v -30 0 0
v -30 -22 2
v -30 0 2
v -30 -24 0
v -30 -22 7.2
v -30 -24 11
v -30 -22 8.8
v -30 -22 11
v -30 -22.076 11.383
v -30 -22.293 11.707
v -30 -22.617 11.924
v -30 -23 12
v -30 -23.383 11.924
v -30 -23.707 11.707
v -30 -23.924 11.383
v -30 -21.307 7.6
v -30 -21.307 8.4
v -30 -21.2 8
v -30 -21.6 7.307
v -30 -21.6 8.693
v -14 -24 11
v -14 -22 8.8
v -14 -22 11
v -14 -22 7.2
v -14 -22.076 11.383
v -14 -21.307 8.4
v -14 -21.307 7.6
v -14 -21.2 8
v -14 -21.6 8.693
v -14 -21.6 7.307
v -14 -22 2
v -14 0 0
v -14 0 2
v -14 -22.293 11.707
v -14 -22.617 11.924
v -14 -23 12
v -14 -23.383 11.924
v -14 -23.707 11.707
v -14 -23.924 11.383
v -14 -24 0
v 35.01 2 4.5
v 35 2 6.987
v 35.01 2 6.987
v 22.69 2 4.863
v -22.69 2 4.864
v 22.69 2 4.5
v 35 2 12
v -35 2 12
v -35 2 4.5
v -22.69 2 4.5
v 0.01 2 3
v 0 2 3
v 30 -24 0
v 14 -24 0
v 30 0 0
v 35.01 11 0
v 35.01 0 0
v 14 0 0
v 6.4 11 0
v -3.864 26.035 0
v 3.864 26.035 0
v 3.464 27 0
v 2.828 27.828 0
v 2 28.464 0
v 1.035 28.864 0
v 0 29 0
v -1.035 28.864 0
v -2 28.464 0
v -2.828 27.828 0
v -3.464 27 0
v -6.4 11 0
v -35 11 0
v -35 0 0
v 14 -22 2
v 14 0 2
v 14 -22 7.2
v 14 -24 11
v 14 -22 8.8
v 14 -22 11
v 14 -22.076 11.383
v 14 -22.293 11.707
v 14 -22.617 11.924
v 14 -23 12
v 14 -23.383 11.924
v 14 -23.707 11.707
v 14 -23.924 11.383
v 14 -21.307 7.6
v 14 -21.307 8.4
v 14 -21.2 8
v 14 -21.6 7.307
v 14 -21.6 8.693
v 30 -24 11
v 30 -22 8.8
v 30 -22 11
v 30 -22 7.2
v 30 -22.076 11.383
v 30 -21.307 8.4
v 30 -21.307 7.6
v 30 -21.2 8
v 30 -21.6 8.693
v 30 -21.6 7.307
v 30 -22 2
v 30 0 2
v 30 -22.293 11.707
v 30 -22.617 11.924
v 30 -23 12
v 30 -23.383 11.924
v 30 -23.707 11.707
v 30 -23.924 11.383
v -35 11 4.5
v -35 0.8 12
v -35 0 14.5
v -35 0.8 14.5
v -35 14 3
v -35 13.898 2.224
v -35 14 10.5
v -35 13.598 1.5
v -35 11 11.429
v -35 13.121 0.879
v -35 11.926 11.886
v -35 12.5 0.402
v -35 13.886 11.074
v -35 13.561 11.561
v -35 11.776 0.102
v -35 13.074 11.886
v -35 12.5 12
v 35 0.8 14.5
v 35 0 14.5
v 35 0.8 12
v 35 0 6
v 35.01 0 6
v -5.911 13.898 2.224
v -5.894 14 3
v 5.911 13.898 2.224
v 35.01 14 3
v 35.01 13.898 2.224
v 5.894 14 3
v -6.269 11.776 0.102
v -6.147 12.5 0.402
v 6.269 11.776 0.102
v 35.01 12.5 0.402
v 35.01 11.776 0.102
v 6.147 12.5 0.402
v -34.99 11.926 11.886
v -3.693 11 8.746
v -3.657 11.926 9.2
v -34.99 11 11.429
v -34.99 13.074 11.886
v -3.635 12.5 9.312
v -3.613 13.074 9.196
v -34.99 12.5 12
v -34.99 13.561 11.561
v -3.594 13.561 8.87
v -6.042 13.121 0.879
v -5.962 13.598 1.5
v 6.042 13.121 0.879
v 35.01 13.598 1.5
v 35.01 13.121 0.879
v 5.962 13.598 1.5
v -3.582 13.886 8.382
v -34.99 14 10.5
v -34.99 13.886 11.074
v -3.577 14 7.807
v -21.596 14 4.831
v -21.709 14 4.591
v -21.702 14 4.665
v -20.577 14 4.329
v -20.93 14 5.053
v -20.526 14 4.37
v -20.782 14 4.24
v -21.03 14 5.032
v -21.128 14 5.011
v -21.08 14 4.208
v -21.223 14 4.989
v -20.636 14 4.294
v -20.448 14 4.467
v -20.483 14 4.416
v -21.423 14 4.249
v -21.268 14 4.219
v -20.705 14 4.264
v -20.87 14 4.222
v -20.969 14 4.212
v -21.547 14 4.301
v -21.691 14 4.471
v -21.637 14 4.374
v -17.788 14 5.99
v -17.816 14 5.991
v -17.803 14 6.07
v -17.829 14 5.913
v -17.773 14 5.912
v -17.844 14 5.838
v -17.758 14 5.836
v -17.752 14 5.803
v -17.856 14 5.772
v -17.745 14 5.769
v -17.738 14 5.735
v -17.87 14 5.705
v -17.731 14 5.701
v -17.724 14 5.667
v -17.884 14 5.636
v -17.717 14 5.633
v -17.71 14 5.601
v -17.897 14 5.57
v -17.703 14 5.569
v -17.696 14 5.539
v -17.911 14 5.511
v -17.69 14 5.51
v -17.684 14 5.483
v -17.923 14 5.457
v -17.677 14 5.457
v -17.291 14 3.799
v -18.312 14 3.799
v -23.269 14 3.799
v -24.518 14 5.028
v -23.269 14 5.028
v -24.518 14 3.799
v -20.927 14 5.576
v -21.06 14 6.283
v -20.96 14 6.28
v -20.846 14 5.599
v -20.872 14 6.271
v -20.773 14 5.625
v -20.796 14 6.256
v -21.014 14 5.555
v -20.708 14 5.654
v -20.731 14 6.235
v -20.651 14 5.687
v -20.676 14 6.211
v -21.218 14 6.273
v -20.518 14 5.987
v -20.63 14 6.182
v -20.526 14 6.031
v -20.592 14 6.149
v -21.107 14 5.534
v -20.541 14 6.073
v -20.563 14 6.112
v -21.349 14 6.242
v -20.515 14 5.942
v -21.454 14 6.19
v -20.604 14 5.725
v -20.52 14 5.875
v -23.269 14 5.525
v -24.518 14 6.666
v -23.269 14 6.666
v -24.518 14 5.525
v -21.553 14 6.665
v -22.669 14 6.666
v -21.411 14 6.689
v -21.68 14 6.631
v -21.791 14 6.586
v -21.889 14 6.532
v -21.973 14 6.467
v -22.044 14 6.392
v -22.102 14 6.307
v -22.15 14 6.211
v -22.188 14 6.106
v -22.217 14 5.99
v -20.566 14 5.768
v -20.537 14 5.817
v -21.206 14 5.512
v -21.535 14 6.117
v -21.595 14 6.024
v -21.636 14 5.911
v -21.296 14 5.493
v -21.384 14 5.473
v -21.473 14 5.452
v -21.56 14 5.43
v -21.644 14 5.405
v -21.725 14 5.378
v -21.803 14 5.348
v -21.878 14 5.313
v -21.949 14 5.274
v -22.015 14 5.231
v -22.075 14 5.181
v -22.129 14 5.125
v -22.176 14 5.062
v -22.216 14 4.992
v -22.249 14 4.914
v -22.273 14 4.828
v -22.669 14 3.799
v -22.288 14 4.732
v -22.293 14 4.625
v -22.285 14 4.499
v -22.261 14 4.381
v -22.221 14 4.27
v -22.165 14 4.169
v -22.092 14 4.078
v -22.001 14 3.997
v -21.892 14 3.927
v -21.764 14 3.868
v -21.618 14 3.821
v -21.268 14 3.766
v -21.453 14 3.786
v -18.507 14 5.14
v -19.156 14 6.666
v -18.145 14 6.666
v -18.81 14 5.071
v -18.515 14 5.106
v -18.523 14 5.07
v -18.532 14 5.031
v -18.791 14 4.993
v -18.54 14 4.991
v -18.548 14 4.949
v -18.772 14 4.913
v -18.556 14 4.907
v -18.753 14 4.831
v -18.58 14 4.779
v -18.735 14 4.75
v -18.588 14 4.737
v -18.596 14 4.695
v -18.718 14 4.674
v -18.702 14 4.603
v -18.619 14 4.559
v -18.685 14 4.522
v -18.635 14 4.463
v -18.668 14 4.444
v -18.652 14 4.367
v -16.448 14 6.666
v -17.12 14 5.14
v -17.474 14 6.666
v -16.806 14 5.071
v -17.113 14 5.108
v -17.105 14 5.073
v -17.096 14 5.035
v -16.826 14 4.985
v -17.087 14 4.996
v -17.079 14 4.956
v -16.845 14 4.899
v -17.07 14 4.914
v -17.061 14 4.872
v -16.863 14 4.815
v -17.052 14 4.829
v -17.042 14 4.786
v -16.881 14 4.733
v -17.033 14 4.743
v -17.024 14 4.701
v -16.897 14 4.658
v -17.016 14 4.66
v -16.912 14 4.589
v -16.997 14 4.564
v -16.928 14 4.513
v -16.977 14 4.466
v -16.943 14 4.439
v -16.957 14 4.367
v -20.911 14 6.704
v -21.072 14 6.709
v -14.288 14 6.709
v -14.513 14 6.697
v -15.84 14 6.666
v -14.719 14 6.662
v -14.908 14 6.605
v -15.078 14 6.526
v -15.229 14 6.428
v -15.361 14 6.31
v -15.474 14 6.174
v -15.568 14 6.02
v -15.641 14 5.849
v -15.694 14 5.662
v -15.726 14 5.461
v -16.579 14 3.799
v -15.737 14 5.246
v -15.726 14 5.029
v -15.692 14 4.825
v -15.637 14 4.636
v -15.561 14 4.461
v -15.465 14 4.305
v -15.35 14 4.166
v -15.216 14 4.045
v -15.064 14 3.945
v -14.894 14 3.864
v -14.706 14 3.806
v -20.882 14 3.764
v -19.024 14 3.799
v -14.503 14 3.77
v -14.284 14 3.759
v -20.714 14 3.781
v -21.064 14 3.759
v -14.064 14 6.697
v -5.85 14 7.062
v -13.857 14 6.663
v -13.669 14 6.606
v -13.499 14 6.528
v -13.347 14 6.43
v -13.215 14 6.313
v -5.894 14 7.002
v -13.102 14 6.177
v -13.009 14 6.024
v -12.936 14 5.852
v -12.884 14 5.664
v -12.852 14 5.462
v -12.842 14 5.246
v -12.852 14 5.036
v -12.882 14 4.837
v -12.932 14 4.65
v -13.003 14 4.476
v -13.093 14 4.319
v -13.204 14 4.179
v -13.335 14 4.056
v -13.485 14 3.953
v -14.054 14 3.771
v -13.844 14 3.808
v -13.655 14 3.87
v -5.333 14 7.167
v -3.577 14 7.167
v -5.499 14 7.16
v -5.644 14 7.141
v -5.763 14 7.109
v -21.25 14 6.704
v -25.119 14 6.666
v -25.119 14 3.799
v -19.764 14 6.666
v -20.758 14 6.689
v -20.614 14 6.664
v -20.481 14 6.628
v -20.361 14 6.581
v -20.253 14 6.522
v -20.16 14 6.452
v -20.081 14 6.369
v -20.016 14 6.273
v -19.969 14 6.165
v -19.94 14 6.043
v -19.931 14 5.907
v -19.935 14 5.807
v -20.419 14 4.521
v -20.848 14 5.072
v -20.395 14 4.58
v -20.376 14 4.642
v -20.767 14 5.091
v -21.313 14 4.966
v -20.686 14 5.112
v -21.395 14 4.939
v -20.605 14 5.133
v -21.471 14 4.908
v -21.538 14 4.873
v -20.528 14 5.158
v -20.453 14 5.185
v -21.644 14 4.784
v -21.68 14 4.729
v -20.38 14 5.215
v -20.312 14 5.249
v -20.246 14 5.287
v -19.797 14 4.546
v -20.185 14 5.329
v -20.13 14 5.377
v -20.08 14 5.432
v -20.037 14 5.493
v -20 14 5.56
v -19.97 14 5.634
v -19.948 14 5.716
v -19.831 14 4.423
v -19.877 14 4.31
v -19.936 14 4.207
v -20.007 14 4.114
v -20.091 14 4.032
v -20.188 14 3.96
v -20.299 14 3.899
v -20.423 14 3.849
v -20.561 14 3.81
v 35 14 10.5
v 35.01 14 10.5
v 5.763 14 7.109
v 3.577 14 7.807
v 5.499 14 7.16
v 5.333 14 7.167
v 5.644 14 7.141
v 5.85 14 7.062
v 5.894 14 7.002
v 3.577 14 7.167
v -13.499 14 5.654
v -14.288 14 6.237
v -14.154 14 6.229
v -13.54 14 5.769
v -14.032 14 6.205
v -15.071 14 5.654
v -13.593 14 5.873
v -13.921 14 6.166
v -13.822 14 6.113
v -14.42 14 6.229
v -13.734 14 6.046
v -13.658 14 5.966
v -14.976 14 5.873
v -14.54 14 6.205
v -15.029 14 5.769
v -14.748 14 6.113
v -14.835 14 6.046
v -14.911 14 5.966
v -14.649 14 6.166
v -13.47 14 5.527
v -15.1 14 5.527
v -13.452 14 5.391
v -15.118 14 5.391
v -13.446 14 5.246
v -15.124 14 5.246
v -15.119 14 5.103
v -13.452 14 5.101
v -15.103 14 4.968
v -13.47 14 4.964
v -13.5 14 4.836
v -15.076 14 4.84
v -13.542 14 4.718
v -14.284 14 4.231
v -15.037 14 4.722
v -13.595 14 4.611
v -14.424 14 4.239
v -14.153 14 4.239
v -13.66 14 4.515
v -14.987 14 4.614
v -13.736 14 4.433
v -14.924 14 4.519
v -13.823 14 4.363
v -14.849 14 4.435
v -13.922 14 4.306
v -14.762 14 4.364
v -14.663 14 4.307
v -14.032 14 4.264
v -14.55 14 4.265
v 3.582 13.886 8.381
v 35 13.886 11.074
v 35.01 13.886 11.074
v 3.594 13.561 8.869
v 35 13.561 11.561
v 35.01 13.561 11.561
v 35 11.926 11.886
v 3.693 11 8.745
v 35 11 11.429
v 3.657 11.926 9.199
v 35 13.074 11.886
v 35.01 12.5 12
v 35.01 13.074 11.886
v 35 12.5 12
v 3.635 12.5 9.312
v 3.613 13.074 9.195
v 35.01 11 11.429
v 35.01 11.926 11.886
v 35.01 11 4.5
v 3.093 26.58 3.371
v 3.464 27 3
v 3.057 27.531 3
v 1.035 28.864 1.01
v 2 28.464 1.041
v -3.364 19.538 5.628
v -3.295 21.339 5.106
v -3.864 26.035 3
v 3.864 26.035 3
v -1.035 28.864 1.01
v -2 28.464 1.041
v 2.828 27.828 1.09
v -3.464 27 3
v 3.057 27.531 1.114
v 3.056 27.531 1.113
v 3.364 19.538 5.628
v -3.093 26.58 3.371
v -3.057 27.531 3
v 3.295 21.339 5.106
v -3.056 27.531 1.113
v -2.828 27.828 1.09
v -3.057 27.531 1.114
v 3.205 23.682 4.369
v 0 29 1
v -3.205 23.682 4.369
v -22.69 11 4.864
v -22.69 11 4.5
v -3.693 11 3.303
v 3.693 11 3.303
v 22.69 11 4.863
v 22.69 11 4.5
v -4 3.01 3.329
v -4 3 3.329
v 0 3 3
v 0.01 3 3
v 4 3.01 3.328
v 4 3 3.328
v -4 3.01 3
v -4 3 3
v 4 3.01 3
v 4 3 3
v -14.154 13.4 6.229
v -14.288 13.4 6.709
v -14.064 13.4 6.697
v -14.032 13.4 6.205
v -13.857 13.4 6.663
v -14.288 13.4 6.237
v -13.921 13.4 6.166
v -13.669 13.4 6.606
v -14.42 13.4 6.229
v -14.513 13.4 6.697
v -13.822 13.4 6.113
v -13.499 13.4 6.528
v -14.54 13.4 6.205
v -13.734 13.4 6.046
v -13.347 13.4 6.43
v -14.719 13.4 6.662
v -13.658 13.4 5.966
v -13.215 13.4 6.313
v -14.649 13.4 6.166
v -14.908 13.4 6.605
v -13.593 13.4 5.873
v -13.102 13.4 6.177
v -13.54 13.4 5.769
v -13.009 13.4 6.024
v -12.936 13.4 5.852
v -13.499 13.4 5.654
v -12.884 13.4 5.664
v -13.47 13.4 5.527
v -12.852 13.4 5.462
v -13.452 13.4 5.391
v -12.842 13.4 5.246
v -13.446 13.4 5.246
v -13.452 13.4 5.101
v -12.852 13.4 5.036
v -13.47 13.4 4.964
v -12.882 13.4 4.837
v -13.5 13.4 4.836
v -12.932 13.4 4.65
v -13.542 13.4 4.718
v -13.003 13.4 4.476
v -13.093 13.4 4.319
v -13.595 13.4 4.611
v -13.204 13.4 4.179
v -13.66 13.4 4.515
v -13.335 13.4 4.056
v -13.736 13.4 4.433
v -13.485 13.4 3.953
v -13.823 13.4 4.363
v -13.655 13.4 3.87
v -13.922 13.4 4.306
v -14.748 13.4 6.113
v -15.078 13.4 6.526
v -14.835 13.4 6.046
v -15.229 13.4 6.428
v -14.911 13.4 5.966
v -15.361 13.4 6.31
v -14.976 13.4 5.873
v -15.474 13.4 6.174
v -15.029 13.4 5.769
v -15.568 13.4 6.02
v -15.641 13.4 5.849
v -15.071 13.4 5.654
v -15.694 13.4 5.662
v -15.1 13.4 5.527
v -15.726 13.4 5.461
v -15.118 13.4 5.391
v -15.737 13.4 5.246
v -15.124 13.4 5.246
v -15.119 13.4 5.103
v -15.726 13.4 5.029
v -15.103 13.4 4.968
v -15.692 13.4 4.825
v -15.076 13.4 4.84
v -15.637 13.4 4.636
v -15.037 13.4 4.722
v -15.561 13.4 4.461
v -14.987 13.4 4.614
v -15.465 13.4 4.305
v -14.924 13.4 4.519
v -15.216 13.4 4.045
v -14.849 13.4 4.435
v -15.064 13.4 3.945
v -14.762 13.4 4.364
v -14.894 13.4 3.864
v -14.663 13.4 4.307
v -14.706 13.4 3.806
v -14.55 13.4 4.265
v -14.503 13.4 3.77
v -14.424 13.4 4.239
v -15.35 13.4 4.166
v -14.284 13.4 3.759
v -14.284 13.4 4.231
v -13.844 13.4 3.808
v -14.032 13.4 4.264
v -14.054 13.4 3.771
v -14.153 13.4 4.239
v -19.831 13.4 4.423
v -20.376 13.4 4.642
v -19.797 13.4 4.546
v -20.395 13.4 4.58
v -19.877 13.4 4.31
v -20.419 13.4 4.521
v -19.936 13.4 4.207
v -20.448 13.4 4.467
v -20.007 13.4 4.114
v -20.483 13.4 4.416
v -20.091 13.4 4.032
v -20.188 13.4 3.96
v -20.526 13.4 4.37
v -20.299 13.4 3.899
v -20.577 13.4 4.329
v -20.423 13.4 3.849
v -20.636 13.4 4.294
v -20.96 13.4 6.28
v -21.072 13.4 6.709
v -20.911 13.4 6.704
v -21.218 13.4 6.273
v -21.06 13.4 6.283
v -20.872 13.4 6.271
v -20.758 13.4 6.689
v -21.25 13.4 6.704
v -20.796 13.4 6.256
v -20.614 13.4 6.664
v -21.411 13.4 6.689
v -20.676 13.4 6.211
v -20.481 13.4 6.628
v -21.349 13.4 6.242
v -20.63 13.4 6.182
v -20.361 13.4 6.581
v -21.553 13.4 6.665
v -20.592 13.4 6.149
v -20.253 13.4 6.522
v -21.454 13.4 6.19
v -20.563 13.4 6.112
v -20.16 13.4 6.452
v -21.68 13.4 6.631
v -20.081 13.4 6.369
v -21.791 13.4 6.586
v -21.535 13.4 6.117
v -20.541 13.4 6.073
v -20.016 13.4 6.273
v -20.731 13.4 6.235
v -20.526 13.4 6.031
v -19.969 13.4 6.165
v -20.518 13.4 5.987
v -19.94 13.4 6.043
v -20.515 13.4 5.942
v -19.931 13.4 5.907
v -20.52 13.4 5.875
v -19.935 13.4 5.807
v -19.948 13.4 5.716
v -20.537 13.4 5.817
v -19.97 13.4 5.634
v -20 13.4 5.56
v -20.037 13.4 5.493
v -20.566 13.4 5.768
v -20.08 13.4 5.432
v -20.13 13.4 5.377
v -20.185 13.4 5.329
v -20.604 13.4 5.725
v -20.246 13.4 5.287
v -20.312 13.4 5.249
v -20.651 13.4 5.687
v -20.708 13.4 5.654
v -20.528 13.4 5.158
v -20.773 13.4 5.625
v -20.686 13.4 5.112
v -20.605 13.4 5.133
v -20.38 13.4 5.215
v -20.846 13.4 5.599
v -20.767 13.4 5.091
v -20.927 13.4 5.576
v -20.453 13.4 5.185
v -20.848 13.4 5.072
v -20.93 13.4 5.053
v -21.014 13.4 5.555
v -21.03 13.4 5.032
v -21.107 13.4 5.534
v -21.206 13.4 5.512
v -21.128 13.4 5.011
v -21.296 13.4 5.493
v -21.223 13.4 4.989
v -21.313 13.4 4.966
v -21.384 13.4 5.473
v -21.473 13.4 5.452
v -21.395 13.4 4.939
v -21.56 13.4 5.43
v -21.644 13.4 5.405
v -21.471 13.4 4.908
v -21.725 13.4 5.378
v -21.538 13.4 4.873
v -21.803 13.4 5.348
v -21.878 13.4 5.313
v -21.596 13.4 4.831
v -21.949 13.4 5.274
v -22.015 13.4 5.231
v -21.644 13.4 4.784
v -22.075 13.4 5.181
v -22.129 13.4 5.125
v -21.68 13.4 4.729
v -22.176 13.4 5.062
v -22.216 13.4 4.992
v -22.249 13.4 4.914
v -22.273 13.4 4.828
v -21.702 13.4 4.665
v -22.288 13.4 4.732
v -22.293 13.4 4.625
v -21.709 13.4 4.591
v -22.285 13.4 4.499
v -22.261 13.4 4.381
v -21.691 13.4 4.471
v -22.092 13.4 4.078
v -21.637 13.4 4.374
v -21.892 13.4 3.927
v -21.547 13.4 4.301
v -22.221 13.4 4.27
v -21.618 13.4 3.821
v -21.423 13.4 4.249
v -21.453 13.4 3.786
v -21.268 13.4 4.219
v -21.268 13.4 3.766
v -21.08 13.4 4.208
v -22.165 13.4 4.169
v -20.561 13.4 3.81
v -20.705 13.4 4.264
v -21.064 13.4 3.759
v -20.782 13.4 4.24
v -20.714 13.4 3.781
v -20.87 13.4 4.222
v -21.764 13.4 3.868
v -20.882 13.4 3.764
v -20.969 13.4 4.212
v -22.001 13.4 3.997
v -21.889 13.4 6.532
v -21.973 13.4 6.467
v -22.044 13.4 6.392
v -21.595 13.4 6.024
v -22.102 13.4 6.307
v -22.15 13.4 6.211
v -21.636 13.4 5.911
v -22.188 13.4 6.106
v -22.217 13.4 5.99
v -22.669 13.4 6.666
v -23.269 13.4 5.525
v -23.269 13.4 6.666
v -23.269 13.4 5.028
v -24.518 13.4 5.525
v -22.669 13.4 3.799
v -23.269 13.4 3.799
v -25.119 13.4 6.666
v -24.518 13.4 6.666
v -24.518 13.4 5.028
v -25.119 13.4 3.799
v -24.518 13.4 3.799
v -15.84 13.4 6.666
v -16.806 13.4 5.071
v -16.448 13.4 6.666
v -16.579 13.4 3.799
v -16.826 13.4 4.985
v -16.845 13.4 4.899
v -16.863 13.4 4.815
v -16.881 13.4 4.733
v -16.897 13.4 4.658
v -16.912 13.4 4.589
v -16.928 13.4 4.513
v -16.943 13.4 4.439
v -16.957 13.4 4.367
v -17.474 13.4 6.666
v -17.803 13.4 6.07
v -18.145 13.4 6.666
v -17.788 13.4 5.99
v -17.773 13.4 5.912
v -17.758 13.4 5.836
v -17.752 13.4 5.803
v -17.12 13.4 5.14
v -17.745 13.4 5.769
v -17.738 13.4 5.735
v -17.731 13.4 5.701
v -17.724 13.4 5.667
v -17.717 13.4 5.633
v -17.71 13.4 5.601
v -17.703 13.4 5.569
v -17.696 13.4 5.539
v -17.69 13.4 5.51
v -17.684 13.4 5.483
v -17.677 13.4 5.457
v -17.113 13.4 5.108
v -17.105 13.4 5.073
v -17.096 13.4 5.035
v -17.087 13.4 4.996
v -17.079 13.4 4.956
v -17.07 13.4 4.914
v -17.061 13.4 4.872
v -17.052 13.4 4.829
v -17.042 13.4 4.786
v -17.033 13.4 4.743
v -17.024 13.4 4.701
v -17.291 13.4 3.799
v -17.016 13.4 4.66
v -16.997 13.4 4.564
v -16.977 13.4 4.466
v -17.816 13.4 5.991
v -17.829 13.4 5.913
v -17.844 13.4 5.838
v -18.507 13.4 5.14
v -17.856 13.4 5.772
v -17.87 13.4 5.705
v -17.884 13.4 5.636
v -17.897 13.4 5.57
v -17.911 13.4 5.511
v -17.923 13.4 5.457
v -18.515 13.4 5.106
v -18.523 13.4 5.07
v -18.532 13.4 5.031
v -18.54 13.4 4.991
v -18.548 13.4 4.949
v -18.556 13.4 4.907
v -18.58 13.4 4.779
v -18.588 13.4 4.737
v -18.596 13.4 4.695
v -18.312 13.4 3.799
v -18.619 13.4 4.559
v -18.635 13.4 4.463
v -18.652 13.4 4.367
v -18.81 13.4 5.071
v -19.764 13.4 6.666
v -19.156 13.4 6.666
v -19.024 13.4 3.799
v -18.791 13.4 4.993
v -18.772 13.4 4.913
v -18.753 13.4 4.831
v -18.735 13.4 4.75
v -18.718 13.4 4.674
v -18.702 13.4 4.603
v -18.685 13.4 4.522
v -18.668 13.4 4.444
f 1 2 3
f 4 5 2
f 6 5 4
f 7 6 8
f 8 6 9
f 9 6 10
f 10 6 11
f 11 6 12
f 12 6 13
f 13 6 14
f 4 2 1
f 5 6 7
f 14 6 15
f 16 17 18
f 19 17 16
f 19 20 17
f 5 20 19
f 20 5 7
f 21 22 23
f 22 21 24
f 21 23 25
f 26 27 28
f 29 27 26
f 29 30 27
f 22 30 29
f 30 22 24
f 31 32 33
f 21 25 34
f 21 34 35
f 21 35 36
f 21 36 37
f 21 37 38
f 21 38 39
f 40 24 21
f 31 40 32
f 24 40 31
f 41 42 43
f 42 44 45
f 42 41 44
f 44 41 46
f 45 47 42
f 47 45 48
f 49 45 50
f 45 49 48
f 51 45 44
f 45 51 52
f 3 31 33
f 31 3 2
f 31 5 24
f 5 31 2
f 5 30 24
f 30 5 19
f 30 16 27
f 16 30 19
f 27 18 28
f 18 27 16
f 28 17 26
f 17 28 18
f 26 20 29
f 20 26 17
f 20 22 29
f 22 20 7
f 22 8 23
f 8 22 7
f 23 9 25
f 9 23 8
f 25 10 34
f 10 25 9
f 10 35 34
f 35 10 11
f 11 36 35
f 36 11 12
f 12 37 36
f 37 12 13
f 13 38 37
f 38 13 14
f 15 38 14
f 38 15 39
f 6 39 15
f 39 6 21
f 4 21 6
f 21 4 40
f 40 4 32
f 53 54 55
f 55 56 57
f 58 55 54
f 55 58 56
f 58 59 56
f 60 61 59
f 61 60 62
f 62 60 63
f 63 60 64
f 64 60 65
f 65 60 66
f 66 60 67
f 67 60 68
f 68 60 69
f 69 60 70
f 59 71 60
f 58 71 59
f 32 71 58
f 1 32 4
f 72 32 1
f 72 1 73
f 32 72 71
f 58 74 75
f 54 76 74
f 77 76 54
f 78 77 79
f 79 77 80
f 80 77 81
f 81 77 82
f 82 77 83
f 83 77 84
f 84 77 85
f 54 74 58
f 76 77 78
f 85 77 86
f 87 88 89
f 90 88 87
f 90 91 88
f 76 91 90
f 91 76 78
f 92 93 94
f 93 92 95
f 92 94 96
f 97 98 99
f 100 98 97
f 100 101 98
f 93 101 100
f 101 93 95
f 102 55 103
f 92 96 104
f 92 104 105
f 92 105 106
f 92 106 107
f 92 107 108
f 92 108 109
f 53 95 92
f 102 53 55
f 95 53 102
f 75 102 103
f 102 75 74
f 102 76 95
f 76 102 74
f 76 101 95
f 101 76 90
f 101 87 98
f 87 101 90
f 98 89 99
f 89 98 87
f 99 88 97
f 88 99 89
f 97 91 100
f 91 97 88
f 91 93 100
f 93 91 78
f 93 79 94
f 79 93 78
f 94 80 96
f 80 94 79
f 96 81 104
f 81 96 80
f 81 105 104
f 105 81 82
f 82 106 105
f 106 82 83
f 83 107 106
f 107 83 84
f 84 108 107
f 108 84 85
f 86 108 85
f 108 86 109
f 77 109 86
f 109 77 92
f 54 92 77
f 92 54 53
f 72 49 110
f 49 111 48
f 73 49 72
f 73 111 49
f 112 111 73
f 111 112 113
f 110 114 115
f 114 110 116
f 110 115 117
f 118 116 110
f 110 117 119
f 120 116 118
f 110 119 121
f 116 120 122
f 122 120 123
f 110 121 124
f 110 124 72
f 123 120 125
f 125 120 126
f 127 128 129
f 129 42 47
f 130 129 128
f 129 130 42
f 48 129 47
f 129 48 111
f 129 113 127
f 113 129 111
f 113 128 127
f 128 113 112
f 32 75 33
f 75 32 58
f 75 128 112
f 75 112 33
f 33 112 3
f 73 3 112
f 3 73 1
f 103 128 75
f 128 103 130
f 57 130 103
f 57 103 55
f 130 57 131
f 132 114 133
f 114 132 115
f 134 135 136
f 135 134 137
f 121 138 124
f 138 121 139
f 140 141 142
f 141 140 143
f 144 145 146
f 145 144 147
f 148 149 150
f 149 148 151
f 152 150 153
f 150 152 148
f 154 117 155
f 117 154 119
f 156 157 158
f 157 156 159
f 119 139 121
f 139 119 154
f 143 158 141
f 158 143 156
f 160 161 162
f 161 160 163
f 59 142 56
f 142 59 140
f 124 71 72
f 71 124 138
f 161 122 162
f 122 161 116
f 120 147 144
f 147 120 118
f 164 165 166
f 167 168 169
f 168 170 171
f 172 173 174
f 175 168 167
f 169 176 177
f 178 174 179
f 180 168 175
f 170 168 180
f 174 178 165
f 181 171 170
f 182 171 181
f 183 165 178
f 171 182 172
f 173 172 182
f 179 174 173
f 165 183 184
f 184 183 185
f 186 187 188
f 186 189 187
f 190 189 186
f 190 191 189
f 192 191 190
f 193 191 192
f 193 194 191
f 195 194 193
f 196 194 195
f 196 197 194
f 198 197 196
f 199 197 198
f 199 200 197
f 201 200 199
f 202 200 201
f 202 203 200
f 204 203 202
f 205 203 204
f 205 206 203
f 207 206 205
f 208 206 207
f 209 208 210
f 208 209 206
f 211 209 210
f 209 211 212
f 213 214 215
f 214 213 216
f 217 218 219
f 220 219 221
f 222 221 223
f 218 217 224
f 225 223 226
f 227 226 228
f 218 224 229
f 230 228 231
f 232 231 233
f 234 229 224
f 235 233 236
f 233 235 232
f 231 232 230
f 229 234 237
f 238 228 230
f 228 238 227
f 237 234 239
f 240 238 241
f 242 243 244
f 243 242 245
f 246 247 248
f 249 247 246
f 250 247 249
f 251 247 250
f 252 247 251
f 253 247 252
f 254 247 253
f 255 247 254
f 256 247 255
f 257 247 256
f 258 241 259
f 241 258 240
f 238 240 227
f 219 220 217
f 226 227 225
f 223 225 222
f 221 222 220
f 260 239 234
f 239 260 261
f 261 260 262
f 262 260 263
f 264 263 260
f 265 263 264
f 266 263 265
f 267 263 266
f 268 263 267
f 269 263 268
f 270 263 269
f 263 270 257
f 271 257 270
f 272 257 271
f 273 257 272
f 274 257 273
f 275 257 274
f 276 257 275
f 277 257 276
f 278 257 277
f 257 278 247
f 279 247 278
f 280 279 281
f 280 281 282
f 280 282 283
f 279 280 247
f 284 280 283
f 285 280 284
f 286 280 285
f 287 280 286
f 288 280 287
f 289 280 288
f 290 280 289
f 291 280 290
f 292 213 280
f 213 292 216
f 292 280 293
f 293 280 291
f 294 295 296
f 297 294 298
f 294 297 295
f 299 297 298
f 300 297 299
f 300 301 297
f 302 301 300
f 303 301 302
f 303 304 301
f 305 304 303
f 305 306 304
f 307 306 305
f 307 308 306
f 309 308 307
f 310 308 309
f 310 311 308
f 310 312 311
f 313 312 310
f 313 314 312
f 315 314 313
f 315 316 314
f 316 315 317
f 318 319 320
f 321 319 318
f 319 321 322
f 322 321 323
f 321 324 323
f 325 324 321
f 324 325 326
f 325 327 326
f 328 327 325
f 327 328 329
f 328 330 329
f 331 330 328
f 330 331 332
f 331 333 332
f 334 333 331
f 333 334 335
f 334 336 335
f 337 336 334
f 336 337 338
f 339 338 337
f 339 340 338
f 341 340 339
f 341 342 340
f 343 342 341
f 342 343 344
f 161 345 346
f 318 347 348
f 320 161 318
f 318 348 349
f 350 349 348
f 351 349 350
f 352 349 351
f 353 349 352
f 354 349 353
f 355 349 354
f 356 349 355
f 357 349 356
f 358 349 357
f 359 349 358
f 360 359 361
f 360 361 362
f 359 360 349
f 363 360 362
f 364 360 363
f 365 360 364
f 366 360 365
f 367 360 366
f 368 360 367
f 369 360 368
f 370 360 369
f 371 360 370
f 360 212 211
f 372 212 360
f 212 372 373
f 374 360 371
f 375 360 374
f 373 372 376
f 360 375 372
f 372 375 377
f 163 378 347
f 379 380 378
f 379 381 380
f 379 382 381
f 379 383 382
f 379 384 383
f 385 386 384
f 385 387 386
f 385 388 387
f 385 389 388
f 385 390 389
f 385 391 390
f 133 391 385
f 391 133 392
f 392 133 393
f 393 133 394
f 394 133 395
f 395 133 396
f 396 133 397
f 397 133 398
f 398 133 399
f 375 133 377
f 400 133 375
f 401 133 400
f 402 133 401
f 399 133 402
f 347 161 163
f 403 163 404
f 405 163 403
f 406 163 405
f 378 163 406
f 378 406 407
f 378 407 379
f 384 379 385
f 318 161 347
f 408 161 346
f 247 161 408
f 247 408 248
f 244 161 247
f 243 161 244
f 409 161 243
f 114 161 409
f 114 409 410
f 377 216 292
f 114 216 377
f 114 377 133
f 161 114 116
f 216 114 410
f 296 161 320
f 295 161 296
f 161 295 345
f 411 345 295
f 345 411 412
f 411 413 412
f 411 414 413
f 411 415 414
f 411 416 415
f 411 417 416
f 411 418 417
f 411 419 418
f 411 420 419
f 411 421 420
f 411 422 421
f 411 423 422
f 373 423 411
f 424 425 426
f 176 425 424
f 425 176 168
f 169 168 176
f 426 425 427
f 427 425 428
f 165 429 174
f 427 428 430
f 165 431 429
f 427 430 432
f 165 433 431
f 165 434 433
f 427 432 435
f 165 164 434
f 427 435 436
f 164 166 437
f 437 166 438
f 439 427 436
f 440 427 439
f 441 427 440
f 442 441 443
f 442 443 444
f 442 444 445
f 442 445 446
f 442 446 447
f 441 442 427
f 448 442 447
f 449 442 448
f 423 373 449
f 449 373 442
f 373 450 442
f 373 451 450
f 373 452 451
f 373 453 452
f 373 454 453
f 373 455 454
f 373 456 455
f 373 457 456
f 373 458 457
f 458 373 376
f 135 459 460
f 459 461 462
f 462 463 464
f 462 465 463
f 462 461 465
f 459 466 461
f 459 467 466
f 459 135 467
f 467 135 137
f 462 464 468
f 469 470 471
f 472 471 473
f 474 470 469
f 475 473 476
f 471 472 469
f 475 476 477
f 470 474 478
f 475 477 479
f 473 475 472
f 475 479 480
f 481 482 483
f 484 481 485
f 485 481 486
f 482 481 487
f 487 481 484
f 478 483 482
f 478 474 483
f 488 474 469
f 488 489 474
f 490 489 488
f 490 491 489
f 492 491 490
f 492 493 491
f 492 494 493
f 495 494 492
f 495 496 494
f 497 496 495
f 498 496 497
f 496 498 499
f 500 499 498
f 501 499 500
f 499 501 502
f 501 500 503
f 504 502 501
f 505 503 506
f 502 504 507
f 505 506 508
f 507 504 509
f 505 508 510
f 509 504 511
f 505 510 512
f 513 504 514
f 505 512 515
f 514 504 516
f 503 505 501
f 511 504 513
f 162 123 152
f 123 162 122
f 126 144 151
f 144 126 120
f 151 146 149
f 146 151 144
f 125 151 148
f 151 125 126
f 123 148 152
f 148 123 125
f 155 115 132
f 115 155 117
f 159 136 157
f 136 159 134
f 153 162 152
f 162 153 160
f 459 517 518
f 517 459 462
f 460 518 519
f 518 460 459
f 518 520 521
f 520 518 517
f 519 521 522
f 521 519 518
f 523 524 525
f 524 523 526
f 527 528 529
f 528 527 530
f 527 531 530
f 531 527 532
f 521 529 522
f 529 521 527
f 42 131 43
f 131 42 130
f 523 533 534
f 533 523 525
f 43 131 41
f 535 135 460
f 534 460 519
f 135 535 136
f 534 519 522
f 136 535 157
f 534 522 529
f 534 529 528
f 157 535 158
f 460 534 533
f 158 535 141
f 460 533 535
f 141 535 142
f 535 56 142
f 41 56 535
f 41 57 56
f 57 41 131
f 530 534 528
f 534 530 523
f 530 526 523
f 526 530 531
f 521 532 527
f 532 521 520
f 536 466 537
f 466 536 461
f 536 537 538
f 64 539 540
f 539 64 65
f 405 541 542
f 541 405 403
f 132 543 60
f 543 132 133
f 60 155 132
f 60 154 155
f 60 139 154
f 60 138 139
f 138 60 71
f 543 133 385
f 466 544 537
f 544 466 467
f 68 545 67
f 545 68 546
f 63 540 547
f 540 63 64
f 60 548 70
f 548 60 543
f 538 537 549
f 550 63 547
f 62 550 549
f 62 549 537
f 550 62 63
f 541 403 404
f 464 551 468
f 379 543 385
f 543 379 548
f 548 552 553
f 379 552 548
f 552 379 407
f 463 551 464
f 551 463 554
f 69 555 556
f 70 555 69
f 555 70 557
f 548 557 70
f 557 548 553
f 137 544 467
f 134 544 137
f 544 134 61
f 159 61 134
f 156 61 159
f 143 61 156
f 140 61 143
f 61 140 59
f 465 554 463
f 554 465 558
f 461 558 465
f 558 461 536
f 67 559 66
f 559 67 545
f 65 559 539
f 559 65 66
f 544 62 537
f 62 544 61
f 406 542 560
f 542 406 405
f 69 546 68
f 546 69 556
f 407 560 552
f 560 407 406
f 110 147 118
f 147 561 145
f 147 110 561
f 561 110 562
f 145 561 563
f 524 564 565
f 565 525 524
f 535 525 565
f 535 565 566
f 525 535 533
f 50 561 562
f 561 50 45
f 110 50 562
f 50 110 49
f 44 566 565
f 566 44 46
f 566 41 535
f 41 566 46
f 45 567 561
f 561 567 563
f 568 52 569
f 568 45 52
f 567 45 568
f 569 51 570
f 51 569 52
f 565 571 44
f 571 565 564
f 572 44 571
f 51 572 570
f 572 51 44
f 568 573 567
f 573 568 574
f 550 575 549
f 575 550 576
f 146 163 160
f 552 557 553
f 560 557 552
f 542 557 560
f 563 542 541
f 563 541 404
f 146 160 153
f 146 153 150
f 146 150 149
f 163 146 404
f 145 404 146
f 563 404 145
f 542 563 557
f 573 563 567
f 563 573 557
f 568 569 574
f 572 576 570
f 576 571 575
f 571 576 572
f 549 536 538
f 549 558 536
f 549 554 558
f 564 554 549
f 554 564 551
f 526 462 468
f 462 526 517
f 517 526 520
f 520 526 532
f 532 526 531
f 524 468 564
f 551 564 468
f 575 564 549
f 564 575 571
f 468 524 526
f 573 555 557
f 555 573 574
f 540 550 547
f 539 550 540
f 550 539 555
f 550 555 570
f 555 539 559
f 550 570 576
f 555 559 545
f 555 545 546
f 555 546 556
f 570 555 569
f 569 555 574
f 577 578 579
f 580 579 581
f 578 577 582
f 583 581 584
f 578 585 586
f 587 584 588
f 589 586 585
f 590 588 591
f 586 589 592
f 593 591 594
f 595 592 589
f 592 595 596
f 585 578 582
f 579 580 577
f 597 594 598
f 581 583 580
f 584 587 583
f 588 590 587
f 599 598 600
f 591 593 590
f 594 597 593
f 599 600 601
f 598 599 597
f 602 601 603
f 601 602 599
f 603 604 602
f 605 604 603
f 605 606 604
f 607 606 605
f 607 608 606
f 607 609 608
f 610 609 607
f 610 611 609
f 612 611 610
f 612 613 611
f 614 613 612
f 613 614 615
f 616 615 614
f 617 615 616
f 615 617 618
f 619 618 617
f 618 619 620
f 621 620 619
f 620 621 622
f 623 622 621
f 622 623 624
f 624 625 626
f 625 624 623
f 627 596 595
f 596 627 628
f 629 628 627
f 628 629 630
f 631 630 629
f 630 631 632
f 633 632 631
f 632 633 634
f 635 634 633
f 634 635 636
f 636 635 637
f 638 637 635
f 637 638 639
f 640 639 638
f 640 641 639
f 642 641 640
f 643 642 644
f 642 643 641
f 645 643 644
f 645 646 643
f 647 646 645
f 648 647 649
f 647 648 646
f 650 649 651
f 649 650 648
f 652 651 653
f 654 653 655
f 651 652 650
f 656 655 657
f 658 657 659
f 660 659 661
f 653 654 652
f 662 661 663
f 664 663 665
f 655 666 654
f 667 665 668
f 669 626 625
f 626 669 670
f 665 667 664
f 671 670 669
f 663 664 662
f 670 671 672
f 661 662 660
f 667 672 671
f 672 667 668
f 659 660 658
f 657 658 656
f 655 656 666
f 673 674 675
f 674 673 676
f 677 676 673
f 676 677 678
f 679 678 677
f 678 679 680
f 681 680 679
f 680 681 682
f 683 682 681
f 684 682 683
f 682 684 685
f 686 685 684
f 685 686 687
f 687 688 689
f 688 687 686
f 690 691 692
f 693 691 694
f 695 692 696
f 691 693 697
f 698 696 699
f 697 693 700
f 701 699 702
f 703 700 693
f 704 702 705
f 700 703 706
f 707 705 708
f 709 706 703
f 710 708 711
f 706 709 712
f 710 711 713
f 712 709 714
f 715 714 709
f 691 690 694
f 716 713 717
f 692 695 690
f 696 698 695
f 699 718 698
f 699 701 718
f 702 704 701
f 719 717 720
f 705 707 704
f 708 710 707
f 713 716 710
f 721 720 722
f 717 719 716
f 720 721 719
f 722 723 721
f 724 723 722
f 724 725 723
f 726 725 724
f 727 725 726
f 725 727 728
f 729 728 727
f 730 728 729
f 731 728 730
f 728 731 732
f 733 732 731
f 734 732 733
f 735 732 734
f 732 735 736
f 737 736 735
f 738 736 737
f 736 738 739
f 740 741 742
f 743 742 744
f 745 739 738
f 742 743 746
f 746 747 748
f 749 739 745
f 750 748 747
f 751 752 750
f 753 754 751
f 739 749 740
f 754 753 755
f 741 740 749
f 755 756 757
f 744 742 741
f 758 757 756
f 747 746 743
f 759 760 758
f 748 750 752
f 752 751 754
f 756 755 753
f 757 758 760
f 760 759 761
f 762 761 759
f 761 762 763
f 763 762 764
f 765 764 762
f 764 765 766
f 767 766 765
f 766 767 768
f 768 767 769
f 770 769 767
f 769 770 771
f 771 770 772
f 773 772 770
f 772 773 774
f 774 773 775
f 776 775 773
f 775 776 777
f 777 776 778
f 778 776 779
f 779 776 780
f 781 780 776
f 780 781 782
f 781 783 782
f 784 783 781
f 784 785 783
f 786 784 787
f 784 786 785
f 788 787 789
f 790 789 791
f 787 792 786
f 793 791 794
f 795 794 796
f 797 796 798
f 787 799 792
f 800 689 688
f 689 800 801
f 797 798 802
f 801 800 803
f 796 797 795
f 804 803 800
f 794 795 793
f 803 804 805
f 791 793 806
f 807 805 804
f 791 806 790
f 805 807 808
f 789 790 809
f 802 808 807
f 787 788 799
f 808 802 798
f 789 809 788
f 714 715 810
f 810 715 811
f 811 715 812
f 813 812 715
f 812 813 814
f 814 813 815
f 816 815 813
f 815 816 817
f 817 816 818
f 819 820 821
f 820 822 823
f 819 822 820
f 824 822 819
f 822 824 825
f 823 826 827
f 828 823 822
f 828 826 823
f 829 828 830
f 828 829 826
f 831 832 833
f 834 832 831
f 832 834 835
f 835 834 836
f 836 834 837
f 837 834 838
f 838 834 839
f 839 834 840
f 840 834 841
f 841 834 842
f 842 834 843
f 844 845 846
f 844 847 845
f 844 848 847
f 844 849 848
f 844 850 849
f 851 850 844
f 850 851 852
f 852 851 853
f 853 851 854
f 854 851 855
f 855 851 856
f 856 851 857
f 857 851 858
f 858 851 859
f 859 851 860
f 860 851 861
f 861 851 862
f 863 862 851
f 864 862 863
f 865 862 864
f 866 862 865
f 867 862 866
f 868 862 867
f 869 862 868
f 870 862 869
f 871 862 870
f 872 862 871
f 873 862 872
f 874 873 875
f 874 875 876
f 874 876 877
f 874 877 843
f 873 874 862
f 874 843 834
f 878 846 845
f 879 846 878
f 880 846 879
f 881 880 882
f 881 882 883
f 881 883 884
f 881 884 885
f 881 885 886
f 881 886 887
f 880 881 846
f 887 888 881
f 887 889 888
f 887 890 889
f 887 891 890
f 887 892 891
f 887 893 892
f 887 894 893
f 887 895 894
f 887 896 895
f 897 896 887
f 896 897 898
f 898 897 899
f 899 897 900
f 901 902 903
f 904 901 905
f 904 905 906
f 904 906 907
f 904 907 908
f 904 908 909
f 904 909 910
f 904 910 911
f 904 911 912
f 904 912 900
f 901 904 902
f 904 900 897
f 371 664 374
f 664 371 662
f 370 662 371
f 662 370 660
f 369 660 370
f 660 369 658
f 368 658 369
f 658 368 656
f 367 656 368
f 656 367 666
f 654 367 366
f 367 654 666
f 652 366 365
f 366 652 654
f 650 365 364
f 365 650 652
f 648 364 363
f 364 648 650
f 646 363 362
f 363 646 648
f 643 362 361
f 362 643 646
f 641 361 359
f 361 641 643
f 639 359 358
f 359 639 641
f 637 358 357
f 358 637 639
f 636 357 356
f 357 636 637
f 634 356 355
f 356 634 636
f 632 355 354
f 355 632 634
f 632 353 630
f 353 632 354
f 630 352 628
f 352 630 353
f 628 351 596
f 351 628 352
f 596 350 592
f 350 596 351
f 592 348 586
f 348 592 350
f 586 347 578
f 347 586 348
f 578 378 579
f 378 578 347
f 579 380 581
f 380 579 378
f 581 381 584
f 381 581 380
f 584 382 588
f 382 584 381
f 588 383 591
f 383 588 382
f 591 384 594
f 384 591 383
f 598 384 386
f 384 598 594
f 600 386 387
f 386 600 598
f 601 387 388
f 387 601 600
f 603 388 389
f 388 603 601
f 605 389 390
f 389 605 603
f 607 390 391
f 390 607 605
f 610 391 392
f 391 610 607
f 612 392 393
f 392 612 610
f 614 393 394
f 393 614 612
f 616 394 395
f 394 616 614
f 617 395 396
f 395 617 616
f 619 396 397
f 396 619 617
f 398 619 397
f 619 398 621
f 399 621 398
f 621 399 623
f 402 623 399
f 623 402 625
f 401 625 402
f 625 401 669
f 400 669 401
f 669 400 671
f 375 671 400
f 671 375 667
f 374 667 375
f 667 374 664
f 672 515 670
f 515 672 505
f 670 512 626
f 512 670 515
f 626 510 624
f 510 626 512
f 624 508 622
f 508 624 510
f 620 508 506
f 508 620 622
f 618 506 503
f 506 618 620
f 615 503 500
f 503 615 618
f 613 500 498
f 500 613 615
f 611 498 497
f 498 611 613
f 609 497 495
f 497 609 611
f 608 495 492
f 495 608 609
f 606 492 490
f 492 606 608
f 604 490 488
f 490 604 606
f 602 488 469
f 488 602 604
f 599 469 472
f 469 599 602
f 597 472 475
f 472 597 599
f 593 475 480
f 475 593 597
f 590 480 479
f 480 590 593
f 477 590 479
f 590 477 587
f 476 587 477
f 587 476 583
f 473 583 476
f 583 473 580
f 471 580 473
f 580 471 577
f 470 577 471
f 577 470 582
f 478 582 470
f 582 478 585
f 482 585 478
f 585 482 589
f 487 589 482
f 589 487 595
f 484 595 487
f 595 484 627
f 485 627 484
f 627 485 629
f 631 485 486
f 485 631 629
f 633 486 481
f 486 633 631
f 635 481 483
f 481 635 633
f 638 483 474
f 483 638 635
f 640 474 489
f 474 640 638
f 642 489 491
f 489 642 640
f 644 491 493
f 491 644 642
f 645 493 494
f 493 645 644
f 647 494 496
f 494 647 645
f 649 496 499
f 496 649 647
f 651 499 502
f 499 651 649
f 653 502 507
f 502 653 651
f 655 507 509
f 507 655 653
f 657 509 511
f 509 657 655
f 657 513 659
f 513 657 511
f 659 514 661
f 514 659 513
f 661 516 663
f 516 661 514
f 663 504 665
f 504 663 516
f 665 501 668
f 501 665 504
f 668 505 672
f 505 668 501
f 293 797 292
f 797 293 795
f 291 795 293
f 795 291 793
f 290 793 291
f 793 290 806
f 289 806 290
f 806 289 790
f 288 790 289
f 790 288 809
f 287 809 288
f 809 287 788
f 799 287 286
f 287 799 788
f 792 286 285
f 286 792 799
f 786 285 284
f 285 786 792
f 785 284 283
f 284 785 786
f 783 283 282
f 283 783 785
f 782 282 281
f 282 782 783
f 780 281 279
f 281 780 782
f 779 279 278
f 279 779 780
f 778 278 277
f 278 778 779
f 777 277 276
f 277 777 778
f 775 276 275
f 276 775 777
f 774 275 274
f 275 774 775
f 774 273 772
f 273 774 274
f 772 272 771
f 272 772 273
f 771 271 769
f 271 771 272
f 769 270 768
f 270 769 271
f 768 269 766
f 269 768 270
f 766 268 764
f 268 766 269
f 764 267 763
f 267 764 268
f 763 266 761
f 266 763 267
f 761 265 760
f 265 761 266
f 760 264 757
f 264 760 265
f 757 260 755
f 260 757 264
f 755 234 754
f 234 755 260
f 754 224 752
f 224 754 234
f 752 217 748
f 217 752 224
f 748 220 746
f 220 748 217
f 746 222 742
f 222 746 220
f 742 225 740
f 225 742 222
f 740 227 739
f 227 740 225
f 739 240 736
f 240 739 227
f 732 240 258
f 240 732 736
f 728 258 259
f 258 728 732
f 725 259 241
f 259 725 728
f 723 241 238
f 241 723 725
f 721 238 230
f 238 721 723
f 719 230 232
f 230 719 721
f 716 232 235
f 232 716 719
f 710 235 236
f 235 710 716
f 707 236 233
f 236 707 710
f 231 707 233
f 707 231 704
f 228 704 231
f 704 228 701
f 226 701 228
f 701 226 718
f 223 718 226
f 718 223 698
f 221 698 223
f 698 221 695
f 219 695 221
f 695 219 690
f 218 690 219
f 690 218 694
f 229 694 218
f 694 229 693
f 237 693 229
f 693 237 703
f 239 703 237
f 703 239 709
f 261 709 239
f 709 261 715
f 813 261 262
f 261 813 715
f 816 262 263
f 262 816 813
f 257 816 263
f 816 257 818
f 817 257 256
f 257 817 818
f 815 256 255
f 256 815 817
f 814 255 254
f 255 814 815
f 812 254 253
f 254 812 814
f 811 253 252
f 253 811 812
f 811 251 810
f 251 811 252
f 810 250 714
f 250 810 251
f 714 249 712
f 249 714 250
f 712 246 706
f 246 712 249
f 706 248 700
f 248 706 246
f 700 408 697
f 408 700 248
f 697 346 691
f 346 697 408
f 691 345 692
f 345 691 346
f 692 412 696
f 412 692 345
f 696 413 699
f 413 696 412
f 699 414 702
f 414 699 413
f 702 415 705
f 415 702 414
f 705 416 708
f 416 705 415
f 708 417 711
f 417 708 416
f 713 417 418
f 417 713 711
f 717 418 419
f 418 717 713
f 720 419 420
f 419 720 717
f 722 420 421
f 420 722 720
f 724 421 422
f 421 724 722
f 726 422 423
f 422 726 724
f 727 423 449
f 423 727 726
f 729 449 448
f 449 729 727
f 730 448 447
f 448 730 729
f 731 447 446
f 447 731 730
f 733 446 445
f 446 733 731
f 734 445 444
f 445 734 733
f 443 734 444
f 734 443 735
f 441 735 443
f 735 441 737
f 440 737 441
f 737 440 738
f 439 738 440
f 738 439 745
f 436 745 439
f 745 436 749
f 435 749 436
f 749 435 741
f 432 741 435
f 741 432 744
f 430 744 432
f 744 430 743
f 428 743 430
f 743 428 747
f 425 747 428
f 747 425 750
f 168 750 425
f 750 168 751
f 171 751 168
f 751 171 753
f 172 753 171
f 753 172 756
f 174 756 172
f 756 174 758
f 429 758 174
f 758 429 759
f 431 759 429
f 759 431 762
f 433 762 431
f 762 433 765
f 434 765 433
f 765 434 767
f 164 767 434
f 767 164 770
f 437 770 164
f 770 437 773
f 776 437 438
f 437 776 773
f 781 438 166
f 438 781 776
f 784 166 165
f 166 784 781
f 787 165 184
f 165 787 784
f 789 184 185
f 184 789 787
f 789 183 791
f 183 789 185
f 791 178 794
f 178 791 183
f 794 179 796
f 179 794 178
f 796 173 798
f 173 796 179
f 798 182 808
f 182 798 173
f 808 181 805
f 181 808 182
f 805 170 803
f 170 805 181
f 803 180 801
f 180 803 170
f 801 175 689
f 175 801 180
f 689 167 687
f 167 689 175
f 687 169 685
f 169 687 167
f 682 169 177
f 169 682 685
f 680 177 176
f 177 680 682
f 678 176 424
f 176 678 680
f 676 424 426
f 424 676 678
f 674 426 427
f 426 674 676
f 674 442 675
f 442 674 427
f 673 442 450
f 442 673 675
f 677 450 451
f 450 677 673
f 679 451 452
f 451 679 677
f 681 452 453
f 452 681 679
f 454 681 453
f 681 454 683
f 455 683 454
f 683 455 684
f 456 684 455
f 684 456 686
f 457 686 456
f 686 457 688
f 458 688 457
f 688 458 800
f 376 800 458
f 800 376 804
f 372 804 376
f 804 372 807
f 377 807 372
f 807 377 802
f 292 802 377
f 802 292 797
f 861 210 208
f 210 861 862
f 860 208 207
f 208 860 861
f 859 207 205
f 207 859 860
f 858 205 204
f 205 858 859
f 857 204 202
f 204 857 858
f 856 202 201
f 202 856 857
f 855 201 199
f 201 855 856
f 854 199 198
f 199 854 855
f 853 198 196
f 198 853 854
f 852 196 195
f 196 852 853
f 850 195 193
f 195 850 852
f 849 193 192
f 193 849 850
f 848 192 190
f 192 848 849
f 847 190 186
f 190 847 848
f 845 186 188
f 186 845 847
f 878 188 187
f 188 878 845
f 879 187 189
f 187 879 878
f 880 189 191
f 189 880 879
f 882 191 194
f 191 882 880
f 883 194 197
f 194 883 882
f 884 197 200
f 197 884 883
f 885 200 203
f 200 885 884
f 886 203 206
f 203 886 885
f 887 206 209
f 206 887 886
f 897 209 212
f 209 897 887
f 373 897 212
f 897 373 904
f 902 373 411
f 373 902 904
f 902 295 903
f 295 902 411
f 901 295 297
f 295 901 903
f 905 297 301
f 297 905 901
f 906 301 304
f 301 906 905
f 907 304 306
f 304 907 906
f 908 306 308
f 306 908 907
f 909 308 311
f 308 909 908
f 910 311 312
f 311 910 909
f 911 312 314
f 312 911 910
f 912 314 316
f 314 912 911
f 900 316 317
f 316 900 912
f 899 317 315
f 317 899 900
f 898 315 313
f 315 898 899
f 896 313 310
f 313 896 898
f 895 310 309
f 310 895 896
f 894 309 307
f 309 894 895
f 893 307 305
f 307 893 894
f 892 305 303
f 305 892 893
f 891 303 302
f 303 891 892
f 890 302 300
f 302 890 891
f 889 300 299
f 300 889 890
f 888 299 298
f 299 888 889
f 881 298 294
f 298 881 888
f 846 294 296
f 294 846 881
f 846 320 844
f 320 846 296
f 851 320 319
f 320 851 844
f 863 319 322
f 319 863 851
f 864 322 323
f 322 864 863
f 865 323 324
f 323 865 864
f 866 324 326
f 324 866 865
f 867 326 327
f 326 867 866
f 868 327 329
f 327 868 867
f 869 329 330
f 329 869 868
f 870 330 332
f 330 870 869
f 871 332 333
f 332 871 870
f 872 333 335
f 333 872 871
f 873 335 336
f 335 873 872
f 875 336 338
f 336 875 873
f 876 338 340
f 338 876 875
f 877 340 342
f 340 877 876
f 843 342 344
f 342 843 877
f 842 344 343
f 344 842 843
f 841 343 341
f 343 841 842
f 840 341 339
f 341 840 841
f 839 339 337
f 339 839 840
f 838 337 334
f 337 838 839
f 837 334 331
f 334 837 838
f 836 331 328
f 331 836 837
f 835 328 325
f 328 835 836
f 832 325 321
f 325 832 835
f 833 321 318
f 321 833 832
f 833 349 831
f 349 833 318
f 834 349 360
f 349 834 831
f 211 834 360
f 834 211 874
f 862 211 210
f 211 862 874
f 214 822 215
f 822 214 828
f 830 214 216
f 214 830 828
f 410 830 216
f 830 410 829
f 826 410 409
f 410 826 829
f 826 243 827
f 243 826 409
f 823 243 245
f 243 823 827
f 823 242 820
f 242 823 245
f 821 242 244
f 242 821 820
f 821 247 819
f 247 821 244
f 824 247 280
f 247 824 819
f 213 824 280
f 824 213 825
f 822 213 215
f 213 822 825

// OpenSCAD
// SPDX-License-Identifier: CERN-OHL-P-2.0
// Copyright 2026 CLSOFTLAB (씨엘소프트랩), Dr. Lee Il-guk (이일국)
// Open Walking Safety Helmet (OWSH) - rain_nozzle_rear (spec §10, patent nozzle 113): clips over
// the rear rim, receives the left and right gutter spouts and drains the water backwards and
// downwards, away from the neck. Parameters are in lib/rain_gutter_lib.scad.
// Print: TPU 95A, upright as exported, no supports (the outlet is solid down to the bed).

include <lib/rain_gutter_lib.scad>

translate([-nozzle_len / 2, 0, 0]) rain_nozzle_rear();
